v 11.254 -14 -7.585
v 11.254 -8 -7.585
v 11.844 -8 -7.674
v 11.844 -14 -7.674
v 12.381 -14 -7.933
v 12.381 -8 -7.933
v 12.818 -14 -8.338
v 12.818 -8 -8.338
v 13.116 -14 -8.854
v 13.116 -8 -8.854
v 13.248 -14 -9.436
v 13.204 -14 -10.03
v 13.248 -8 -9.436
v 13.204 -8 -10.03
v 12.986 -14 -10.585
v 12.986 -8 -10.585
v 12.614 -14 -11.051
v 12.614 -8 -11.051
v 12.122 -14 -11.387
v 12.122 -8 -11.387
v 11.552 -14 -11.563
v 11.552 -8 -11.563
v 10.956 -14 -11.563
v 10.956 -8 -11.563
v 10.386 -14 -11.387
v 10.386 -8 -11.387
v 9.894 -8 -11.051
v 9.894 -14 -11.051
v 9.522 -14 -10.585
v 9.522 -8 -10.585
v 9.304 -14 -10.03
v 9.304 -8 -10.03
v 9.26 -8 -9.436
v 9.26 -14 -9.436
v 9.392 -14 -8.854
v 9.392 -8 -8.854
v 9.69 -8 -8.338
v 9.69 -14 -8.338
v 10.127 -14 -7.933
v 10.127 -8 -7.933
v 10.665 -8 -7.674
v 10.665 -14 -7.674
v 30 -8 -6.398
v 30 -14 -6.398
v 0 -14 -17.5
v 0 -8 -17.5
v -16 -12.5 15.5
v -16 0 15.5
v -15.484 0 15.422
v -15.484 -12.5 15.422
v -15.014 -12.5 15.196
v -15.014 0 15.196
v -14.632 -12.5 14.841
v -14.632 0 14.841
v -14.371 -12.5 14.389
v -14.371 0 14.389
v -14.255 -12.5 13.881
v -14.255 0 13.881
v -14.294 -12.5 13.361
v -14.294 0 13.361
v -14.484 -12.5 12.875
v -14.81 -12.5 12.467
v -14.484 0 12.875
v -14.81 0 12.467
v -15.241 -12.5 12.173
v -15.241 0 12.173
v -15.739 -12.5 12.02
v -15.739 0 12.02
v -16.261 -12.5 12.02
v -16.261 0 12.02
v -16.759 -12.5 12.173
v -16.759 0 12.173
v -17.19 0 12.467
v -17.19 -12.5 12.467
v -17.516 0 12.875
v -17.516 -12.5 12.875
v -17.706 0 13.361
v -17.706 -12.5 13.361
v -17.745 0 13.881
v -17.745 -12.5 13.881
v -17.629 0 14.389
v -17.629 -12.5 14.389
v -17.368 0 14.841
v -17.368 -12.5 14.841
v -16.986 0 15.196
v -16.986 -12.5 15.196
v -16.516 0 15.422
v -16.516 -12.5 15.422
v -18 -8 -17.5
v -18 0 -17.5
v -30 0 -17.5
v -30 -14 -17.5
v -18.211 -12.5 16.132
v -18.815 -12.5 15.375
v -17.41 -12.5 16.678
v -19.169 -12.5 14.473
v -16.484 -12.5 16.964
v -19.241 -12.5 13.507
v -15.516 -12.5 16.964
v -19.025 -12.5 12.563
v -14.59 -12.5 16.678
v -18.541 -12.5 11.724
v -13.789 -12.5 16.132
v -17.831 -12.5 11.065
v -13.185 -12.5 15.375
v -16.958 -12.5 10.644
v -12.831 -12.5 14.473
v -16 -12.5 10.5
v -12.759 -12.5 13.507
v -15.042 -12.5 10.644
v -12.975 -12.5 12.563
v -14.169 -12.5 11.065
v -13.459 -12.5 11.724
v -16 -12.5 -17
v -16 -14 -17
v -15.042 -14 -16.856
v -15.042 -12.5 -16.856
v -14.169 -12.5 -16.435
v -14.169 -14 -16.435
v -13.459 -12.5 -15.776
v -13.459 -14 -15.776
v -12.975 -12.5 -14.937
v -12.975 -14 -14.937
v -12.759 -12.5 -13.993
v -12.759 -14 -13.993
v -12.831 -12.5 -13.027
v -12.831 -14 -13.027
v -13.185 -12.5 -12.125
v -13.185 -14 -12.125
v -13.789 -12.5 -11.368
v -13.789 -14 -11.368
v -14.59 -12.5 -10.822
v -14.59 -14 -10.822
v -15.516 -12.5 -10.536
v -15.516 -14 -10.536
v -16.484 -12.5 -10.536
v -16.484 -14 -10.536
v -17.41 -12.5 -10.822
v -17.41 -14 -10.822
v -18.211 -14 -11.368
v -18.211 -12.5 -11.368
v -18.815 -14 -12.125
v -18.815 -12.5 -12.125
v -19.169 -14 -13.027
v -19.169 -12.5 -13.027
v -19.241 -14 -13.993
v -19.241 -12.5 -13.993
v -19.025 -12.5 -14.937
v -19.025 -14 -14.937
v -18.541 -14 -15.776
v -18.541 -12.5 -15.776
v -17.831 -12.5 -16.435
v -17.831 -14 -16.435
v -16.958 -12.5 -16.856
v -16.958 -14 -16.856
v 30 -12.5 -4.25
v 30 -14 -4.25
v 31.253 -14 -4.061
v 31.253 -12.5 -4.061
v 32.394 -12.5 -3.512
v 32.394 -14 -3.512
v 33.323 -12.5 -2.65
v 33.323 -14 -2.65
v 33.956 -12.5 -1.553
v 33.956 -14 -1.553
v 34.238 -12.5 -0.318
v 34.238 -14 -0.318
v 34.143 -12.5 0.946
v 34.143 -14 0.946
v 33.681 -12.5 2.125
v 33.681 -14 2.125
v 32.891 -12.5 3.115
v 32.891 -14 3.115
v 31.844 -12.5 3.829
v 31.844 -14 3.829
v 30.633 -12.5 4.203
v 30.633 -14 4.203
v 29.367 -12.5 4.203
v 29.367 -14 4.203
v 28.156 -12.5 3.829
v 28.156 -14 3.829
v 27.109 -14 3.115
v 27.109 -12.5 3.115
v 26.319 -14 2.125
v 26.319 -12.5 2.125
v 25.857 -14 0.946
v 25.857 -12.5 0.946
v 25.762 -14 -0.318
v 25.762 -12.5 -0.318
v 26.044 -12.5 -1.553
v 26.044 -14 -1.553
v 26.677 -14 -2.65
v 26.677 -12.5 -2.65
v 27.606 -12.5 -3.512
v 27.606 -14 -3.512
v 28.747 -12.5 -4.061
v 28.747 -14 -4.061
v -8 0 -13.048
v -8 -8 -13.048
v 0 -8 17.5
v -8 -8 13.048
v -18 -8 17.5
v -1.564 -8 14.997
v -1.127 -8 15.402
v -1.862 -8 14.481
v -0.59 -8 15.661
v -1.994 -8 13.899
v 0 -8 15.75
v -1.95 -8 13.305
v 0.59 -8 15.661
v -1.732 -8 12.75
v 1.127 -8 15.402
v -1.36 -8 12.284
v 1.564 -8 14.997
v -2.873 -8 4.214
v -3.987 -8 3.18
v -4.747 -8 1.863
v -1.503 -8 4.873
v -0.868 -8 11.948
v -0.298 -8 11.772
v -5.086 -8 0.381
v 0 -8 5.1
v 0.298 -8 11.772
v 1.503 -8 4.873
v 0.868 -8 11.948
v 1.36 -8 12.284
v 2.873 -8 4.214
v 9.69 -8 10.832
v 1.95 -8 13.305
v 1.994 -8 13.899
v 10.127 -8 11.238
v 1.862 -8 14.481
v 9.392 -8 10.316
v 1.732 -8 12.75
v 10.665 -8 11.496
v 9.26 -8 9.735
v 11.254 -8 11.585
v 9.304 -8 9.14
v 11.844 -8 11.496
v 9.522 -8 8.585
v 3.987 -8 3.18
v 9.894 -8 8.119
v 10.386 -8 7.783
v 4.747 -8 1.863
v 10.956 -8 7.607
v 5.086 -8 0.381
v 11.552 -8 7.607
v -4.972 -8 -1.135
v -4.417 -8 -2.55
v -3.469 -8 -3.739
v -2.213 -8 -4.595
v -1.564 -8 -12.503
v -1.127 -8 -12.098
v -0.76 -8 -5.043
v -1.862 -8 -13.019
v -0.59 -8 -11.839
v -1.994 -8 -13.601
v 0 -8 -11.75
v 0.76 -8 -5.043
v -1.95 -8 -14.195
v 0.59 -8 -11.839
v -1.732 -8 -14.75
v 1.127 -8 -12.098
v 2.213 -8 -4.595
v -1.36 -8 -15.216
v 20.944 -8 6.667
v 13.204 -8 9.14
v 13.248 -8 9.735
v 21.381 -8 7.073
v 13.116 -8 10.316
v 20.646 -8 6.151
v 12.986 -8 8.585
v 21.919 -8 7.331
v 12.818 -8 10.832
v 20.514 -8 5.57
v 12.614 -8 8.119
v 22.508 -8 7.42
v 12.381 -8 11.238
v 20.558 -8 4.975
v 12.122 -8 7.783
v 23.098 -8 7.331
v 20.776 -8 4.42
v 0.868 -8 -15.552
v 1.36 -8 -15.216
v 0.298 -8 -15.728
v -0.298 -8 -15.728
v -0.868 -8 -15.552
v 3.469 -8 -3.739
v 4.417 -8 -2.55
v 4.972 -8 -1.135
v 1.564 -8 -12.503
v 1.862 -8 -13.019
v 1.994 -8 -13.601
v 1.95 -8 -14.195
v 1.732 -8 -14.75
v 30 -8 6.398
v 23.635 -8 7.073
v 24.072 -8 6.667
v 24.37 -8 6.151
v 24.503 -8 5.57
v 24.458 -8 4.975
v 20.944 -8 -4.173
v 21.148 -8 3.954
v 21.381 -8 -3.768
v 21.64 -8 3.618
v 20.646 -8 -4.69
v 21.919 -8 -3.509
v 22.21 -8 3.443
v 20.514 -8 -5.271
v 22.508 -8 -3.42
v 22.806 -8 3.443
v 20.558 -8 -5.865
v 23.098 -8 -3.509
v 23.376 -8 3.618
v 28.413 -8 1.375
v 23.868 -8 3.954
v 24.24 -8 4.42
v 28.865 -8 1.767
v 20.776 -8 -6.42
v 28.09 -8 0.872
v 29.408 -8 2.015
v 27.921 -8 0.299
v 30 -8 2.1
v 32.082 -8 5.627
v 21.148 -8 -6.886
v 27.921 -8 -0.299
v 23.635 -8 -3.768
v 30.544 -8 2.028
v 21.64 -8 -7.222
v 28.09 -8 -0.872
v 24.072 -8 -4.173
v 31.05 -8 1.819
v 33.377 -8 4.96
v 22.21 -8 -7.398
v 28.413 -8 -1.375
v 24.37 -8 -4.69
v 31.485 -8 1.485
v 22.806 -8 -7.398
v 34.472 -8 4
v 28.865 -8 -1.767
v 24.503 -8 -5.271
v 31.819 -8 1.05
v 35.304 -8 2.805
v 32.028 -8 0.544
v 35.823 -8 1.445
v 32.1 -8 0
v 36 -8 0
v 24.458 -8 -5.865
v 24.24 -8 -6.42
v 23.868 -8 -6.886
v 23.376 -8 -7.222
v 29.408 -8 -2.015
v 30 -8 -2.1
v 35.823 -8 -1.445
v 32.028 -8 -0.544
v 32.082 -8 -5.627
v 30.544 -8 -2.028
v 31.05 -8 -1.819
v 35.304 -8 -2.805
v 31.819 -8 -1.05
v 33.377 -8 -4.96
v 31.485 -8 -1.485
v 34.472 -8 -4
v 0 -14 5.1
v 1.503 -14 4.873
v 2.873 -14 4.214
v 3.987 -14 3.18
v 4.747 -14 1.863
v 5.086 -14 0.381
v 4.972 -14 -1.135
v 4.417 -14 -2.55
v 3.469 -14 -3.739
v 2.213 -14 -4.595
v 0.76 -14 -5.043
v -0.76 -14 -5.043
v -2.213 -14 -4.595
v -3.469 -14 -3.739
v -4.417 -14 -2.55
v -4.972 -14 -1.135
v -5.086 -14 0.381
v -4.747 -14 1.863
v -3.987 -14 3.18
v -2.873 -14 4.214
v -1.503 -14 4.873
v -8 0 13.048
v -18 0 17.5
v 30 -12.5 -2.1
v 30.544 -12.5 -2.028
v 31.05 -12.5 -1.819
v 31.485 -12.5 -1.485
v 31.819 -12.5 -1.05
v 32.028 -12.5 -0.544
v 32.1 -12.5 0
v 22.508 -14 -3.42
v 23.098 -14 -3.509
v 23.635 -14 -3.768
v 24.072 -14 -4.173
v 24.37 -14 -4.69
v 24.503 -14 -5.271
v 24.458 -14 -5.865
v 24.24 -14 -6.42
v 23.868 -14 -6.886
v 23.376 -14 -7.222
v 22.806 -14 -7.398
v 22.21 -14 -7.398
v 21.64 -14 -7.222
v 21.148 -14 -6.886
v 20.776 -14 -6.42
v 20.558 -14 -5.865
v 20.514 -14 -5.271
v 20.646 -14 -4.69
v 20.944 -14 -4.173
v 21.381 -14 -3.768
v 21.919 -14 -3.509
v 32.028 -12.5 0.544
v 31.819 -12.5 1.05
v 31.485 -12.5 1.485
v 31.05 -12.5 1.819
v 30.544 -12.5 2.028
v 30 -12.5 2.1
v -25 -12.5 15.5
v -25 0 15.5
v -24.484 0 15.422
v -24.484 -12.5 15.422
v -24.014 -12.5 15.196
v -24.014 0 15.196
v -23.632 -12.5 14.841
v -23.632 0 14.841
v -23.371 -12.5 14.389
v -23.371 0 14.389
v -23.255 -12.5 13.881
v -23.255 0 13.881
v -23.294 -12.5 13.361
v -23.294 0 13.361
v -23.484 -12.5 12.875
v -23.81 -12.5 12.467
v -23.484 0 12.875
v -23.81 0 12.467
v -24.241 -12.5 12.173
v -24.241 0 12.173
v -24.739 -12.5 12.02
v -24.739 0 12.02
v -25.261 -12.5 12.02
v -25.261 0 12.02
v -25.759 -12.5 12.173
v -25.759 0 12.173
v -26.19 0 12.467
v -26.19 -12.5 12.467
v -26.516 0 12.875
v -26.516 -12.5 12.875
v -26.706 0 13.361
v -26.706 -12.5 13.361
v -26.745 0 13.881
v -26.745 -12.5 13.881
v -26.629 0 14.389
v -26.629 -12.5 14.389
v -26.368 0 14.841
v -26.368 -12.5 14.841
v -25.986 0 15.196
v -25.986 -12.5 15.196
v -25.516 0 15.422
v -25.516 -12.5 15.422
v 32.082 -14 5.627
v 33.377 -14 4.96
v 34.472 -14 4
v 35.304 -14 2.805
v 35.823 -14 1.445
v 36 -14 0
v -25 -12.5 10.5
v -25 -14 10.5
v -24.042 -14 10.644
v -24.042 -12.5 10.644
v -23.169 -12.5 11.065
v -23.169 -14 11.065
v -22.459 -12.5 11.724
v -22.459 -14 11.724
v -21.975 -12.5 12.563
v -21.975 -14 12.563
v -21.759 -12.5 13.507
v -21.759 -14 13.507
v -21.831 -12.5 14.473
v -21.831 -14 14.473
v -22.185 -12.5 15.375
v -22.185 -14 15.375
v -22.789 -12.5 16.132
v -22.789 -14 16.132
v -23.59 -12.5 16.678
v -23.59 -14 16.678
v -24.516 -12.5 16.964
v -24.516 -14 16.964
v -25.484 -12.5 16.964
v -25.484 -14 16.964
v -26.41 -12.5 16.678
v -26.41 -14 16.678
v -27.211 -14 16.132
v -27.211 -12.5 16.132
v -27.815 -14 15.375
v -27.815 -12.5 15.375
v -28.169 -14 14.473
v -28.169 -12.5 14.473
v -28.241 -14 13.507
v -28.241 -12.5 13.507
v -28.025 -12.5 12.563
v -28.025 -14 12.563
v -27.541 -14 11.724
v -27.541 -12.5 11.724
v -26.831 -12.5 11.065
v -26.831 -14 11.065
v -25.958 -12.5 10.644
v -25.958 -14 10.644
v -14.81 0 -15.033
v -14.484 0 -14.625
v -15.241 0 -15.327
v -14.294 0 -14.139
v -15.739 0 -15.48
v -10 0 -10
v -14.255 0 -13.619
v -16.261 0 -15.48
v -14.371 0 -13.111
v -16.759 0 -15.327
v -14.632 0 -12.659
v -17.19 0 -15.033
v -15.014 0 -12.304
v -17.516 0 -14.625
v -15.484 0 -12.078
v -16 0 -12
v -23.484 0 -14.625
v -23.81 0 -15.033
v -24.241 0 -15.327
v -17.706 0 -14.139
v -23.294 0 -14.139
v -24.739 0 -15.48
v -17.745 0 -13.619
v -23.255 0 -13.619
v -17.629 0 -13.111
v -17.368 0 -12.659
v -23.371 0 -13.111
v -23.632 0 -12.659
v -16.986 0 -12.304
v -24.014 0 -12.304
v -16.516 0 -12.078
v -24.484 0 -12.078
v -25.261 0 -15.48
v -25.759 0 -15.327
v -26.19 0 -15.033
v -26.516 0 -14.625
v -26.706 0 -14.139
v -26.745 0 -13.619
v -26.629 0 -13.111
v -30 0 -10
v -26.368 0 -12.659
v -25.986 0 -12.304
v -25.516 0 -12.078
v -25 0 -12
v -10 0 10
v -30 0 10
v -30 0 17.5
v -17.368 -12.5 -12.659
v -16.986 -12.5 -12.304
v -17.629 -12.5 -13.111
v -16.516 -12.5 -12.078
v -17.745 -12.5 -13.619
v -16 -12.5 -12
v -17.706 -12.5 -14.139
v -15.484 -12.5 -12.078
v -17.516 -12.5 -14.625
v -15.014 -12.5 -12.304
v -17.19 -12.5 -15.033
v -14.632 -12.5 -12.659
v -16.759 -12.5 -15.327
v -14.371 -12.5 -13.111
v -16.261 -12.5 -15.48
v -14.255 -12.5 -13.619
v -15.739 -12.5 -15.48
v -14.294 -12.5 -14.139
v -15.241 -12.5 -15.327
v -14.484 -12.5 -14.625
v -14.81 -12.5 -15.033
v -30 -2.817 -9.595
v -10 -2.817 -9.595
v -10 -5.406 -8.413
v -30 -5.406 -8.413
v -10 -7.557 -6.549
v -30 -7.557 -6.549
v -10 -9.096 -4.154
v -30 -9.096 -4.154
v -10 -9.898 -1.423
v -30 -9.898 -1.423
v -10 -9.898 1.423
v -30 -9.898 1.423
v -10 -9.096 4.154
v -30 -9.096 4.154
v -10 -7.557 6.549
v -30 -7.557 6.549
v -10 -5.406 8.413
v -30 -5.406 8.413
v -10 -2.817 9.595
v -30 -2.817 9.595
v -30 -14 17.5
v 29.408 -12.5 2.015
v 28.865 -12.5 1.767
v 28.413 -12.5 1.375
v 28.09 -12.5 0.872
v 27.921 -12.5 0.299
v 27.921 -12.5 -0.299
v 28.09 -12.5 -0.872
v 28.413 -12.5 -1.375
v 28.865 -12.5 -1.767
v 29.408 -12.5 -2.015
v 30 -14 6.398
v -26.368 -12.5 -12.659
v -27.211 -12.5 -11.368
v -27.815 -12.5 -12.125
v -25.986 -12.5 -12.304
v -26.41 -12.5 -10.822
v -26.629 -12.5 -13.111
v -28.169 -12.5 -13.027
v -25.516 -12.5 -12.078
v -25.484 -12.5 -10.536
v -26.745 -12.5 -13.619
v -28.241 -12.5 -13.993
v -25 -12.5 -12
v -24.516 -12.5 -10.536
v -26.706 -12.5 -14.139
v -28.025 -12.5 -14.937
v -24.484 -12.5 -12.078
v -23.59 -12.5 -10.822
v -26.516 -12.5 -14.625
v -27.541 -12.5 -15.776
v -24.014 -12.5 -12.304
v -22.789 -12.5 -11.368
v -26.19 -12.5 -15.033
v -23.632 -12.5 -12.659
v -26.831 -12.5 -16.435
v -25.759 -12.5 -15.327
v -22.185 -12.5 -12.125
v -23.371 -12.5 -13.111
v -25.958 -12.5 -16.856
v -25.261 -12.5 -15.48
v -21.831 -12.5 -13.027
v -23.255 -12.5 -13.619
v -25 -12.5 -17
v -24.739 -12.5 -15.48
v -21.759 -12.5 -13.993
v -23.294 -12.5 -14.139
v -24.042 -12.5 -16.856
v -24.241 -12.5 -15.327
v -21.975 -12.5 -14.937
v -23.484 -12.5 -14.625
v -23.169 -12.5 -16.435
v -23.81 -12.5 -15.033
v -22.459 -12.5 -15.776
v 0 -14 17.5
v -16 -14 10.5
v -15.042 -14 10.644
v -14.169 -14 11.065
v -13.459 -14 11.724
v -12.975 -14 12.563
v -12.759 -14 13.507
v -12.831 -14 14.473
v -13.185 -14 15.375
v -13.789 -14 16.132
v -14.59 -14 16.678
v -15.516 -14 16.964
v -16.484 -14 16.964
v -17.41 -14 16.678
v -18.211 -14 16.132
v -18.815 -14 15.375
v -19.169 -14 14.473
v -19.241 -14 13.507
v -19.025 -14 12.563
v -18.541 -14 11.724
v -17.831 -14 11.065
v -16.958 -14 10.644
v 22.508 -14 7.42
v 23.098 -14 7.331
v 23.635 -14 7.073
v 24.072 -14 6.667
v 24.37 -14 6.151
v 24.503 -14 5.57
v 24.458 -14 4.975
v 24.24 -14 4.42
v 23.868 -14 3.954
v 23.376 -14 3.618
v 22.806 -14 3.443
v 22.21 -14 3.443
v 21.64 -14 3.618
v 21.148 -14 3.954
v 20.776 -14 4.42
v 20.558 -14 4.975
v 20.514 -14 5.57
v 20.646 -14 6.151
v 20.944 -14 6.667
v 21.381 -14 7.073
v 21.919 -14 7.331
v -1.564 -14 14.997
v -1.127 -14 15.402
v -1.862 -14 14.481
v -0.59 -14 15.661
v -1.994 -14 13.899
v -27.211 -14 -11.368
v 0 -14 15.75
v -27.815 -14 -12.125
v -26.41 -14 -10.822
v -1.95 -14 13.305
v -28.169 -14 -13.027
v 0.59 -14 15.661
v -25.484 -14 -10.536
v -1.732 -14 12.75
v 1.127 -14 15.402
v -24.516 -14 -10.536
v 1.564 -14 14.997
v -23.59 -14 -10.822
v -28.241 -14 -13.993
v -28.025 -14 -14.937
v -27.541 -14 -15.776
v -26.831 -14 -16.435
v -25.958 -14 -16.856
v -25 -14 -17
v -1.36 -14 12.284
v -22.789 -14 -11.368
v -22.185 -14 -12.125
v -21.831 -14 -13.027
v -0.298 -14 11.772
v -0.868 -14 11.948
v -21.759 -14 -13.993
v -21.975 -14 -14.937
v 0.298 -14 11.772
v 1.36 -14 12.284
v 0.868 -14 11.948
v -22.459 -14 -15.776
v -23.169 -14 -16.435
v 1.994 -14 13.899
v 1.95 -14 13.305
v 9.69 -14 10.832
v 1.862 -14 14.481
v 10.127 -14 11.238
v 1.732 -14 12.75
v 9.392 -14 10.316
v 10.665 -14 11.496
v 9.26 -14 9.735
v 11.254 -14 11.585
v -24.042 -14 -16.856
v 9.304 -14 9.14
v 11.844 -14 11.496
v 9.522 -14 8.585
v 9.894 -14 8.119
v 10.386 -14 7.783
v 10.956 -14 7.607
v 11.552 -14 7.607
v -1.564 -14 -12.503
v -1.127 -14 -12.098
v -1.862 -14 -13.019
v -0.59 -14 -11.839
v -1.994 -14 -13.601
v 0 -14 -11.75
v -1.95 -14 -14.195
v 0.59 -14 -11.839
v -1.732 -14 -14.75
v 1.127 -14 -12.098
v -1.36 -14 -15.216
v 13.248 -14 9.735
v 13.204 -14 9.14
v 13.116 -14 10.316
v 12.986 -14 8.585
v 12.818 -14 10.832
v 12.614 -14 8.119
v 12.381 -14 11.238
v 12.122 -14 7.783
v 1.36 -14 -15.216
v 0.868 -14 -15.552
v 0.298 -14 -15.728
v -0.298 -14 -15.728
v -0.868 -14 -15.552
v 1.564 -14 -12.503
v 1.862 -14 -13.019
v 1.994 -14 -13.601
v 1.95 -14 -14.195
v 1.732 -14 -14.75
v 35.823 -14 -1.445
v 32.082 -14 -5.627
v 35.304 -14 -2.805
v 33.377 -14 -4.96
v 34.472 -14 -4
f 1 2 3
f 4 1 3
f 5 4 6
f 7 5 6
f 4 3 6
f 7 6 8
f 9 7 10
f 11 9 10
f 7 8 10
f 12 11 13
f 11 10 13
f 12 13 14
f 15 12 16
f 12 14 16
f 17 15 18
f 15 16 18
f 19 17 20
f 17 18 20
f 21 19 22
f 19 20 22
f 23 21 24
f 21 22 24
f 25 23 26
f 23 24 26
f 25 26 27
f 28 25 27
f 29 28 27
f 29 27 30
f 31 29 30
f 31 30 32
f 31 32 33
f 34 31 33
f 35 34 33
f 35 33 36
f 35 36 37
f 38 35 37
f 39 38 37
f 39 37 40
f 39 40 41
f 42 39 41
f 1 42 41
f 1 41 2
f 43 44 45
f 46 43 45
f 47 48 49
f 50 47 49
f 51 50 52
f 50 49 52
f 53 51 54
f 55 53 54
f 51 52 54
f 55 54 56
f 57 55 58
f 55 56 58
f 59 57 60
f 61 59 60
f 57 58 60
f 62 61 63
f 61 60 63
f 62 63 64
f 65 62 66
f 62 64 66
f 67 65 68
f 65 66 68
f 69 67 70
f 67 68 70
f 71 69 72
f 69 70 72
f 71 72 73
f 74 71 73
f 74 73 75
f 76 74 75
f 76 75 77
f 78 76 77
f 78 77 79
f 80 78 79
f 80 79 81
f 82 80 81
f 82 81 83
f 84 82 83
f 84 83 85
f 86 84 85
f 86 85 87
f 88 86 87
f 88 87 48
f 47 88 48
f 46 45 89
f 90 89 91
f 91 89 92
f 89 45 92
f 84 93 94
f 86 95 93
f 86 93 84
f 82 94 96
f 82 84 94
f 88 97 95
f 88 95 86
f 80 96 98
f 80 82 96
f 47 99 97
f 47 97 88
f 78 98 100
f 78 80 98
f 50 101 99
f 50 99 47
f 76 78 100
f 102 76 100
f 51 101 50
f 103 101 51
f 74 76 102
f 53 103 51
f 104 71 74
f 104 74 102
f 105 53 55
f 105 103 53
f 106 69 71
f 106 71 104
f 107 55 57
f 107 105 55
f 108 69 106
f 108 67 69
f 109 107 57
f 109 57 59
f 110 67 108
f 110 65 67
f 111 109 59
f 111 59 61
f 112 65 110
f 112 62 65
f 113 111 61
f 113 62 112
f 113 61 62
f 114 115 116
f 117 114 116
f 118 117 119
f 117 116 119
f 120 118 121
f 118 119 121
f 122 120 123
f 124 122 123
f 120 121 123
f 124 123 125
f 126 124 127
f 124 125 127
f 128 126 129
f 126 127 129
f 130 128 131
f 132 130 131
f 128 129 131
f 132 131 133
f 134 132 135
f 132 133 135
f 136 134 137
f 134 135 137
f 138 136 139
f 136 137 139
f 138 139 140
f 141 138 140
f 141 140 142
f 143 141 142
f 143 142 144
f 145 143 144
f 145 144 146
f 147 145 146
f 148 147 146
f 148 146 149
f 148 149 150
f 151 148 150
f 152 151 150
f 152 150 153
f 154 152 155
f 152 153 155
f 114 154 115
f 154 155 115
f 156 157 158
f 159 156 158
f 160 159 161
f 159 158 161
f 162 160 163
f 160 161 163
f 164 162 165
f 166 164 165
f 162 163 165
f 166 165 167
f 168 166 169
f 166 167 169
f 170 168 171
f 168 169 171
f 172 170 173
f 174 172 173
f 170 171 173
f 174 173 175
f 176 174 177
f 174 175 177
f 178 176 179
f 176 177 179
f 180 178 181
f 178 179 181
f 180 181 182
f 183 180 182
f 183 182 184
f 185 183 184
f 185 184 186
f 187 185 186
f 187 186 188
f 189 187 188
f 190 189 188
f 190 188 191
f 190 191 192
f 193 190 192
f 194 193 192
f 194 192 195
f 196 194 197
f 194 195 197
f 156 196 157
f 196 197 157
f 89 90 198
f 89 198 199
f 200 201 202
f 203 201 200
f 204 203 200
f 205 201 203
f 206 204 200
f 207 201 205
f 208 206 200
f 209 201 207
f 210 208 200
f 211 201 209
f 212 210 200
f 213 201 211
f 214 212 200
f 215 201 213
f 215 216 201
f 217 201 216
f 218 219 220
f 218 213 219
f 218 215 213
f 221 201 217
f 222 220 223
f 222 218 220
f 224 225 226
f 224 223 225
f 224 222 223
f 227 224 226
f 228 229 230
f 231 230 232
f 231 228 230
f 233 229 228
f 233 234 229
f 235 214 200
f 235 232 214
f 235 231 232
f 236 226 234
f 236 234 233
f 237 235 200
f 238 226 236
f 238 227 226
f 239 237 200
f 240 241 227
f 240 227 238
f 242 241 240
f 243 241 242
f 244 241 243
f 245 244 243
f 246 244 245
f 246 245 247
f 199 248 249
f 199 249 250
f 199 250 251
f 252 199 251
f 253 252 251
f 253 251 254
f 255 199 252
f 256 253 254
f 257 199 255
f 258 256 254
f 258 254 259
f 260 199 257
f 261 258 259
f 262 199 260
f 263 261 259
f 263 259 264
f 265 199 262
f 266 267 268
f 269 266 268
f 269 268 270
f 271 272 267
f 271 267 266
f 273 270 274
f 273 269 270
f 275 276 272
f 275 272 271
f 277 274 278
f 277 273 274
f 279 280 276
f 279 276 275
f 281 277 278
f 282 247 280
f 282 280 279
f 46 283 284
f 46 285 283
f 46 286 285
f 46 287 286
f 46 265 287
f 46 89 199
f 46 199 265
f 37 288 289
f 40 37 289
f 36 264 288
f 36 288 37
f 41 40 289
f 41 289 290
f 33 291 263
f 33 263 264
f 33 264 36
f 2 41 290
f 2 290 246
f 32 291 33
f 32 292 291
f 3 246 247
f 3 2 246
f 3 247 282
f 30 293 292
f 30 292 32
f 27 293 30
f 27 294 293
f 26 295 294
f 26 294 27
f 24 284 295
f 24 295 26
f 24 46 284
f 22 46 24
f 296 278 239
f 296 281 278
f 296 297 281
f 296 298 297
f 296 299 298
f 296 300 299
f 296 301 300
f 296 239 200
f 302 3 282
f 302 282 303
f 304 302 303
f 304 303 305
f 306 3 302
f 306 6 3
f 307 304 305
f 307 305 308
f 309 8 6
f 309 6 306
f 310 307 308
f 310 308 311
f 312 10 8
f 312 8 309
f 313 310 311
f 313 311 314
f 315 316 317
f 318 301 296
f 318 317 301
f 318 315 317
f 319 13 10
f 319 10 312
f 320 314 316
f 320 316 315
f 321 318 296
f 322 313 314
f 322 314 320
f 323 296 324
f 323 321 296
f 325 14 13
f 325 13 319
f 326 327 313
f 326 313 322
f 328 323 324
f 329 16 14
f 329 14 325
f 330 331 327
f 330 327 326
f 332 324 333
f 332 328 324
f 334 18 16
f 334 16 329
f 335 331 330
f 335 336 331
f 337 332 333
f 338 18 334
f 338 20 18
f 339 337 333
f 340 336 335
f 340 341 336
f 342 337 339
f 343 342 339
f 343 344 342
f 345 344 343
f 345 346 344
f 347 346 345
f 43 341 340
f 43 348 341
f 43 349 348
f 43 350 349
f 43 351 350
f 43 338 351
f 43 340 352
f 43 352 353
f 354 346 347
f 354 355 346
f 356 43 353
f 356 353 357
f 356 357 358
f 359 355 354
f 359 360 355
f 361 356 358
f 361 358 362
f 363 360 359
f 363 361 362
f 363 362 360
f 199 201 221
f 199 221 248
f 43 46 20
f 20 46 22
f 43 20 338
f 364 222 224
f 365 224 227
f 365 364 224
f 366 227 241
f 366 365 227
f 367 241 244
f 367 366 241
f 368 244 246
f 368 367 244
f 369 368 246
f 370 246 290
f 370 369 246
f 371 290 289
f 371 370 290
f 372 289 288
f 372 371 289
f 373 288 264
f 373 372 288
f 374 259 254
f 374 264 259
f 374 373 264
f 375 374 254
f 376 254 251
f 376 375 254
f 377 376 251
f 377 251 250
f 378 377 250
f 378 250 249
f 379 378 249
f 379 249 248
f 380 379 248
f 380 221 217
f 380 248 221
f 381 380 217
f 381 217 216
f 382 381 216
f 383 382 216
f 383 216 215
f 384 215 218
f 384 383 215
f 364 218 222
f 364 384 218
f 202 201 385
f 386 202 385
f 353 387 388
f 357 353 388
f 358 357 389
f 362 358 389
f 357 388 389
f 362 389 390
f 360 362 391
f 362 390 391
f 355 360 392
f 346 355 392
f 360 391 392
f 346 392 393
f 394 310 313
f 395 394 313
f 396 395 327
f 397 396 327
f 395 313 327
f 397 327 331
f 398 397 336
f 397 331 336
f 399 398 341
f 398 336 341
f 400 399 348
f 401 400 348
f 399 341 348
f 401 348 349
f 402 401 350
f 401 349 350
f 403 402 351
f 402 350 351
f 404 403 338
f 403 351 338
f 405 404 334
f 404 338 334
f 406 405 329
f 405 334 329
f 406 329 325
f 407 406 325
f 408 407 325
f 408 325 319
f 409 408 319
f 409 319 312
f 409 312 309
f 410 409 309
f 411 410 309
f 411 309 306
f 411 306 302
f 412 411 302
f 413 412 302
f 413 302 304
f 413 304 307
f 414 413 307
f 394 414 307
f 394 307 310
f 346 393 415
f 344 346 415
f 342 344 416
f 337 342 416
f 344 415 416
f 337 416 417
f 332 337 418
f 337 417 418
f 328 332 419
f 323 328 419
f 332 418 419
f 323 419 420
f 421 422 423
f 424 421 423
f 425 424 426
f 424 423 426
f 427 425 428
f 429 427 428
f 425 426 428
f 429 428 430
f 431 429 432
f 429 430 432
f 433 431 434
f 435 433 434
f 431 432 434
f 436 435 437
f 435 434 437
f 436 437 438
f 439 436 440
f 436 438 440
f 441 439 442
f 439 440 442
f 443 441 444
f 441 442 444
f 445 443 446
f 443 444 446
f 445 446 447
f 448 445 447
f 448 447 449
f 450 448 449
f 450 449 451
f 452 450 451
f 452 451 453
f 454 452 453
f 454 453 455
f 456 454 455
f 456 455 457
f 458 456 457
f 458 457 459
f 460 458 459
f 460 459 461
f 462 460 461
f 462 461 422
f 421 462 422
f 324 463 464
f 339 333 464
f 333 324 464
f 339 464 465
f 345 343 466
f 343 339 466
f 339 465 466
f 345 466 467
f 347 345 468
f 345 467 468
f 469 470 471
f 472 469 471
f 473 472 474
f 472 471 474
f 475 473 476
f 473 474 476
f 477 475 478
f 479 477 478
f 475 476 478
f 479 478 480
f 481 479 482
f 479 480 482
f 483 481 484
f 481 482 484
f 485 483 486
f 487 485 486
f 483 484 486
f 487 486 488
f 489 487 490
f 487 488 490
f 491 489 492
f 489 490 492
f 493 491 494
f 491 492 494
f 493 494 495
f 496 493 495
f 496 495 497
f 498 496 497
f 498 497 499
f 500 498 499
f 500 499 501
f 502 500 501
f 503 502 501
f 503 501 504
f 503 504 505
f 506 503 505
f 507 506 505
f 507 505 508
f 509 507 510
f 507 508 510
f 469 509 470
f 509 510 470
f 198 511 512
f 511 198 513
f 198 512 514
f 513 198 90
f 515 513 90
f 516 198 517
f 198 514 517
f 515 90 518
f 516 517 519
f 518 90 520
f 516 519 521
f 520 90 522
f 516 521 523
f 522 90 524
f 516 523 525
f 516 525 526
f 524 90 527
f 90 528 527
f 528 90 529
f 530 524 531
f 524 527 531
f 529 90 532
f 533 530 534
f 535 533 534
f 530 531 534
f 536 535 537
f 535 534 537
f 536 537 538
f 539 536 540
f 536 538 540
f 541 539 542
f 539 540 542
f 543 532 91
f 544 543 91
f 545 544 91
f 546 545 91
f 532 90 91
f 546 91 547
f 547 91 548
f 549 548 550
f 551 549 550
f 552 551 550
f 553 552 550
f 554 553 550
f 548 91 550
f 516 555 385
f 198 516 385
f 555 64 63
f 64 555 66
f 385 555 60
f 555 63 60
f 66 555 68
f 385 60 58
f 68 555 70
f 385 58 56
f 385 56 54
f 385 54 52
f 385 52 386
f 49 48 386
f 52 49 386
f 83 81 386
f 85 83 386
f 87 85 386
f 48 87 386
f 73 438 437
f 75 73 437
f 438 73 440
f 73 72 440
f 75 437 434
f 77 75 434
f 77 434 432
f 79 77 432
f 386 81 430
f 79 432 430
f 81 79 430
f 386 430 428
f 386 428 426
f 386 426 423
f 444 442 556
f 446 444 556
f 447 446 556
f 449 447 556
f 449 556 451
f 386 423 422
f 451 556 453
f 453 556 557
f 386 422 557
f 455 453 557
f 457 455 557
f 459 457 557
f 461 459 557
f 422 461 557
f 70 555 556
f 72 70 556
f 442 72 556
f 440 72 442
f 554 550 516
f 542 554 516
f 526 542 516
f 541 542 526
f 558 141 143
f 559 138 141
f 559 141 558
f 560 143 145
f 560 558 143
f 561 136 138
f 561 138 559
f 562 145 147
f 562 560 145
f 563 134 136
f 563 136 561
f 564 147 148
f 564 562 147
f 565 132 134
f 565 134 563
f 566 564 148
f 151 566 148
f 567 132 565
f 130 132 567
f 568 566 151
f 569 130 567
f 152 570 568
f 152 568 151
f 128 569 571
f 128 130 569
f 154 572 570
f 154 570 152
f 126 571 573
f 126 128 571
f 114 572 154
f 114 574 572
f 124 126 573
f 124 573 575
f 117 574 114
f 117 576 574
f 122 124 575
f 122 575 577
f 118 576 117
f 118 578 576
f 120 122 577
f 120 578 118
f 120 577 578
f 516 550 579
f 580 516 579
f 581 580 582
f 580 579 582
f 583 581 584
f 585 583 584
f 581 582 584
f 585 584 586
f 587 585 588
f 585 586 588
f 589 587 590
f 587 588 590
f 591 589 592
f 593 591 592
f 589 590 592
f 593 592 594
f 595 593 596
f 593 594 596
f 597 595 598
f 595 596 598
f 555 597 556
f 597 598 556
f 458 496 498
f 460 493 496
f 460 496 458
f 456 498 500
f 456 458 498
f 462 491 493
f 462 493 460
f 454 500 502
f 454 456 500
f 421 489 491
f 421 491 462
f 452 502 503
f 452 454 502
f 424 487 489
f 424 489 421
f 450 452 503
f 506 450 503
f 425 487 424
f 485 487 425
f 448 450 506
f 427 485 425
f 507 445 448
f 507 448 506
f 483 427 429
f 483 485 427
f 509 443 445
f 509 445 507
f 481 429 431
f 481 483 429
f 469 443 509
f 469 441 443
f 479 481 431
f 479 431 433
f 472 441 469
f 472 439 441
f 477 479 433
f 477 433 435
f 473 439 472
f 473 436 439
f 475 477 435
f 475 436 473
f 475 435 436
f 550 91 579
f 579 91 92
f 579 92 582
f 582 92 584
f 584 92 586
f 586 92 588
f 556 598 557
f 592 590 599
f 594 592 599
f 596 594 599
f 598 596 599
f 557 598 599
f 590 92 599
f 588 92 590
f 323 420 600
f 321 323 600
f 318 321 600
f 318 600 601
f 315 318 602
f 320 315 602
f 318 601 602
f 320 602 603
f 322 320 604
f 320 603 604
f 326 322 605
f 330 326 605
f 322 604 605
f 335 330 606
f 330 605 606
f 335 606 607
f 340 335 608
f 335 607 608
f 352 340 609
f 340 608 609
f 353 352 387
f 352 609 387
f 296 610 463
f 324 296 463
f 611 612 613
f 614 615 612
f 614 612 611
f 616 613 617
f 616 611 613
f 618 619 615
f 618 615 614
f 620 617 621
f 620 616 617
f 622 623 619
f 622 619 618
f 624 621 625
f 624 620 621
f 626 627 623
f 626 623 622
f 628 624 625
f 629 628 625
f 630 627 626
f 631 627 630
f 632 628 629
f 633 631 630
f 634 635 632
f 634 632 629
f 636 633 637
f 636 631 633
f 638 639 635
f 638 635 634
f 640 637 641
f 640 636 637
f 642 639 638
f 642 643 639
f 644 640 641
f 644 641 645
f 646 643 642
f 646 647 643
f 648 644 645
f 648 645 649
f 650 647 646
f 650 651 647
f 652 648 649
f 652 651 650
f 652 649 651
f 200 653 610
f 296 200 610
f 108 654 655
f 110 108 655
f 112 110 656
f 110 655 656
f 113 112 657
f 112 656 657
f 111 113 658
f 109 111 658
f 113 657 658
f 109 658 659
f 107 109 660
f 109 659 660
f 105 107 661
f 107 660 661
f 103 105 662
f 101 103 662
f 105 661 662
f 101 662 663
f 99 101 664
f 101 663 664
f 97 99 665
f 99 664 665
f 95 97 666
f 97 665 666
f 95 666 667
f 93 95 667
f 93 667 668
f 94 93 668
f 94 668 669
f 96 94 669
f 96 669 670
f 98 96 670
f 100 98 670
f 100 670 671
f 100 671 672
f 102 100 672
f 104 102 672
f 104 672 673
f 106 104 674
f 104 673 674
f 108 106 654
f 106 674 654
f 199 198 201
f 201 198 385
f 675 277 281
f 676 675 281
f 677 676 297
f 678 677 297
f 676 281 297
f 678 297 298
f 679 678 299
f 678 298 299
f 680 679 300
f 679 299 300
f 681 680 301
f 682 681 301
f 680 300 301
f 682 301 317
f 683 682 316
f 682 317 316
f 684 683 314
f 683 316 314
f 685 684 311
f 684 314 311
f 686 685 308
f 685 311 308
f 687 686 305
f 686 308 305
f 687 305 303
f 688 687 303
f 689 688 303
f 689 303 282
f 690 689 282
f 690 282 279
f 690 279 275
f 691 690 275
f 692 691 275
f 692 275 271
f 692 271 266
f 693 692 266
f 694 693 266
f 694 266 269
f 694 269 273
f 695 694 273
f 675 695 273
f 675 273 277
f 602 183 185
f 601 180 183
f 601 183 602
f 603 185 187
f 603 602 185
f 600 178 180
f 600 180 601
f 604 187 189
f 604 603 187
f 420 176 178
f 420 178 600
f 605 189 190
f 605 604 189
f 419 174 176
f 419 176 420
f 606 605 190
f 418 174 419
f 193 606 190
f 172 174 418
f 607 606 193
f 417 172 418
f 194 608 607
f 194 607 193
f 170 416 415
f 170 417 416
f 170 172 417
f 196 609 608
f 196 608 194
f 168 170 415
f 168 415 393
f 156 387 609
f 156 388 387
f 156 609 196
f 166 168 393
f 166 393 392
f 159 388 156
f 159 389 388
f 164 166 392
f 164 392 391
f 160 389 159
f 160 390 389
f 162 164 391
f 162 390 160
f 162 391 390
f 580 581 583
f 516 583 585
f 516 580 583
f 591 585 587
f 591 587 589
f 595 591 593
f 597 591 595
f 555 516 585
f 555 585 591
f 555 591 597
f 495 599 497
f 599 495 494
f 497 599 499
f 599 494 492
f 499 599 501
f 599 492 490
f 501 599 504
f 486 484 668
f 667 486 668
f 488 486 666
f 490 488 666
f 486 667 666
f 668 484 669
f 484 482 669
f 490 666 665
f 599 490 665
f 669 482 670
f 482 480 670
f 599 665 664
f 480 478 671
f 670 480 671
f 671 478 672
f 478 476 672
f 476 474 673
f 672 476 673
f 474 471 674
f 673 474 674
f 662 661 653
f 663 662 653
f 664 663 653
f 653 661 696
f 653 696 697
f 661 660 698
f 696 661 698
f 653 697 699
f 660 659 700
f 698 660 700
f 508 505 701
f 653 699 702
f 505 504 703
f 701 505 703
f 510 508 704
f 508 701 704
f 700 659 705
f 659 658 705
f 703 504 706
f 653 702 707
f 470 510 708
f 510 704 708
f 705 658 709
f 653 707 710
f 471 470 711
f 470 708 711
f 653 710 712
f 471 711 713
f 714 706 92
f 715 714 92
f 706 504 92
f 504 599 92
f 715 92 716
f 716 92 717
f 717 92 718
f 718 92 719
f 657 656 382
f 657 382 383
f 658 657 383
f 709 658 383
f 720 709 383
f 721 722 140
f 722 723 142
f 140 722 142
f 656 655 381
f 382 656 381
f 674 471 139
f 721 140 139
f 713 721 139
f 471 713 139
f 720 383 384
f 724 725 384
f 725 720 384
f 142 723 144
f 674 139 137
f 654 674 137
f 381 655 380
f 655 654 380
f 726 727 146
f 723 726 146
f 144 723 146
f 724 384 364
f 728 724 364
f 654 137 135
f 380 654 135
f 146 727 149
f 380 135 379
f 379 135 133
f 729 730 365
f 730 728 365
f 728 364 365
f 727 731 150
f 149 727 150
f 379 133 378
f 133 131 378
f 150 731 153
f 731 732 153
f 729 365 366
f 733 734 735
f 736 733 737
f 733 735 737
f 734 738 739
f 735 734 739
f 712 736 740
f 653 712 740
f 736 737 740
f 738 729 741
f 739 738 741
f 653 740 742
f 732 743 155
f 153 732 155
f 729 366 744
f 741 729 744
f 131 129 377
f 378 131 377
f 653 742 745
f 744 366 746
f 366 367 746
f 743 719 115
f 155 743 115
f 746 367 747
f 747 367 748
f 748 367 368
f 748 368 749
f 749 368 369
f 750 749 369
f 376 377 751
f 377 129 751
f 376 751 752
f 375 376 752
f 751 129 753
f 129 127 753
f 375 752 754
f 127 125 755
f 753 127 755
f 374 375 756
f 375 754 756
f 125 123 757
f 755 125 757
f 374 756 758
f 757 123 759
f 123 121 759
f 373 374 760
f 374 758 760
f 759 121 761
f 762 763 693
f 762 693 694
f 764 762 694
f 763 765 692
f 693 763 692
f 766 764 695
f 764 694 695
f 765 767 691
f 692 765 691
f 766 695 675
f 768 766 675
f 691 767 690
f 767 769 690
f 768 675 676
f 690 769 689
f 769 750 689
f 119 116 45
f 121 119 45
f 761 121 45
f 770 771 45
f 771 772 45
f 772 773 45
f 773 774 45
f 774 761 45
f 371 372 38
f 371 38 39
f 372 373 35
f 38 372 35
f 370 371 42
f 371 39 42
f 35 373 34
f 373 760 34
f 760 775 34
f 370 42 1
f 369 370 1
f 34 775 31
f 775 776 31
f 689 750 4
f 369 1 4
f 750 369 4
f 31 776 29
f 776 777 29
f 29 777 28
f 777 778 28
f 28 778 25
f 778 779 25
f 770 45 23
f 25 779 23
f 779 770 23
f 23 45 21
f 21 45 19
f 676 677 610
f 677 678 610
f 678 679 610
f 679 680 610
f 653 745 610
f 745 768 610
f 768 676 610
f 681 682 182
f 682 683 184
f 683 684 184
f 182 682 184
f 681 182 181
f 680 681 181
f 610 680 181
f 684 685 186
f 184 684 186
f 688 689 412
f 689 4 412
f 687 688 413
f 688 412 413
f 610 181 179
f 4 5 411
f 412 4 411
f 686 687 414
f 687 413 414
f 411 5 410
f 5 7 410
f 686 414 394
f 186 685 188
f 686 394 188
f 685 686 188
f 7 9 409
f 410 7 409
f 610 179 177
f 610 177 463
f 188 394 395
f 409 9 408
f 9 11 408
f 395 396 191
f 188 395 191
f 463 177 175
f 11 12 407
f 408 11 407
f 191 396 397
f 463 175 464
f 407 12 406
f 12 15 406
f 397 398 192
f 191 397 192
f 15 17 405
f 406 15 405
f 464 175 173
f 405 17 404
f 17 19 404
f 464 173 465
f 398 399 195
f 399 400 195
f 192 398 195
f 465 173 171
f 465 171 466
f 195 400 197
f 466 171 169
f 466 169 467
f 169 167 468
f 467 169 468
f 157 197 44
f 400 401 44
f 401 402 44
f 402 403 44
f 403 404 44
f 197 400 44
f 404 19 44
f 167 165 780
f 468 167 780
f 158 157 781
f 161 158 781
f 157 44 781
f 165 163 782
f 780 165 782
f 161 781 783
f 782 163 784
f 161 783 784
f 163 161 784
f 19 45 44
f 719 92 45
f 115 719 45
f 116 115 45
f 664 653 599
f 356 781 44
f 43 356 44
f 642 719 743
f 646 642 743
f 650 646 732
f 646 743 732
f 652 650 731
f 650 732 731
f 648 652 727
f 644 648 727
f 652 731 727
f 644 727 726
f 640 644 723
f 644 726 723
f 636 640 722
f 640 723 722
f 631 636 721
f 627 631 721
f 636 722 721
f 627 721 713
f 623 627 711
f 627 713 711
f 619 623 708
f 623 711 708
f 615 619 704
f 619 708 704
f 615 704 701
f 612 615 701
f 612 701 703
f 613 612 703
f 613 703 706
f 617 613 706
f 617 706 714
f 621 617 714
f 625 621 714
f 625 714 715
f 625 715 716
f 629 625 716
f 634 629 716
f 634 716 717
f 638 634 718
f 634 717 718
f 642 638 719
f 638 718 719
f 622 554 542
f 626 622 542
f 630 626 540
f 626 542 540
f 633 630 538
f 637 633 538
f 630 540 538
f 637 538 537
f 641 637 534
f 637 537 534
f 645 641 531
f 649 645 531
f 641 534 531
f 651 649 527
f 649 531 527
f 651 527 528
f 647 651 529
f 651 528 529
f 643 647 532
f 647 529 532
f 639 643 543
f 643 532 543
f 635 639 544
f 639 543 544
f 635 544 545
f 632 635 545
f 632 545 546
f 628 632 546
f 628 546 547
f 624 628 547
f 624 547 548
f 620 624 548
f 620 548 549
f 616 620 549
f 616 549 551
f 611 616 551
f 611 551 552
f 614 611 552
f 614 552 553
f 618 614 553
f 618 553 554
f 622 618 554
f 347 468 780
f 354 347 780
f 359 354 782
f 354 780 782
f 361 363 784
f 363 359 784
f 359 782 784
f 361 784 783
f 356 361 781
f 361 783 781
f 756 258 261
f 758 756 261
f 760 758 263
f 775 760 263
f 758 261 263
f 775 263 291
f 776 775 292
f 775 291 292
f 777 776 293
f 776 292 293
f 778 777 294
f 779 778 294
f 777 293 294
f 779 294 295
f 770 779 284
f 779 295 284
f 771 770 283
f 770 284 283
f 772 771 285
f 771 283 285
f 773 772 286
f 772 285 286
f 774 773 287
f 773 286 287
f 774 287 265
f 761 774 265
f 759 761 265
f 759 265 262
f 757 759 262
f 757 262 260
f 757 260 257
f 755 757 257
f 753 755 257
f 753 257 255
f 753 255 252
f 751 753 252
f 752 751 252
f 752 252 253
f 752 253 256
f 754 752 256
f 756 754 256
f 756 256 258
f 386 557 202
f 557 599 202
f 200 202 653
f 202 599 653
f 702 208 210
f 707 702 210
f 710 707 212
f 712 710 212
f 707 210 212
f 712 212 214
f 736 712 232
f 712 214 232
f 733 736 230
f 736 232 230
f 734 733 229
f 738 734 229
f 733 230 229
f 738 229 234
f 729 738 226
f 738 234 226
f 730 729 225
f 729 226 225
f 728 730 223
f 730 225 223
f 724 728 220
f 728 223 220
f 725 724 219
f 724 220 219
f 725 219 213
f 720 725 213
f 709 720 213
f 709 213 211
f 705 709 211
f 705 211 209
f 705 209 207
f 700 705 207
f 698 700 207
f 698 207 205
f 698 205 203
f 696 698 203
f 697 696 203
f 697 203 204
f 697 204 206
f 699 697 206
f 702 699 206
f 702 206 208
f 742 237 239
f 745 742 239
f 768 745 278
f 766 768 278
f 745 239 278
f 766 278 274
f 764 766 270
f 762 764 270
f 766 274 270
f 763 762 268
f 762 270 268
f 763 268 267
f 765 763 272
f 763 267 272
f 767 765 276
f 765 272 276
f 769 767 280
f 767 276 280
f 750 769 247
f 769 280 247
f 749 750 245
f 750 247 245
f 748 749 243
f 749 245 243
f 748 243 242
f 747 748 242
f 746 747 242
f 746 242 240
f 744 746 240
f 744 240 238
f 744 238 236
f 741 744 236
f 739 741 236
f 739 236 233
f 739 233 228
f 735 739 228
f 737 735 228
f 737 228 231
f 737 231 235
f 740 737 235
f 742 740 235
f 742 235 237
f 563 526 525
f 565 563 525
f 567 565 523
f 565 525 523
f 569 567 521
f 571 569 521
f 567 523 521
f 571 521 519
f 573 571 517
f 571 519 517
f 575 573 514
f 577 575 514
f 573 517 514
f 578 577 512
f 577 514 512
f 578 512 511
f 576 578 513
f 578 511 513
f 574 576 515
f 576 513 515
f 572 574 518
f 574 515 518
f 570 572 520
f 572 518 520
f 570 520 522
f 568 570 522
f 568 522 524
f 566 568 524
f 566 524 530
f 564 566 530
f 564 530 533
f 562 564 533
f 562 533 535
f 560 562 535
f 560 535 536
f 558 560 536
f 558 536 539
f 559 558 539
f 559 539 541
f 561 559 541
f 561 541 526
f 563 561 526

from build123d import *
from OCP.BRepFilletAPI import BRepFilletAPI_MakeChamfer

# Parameters (mm, degrees)
BOSS_EXTRUDE1_DEPTH      = 14
BOSS_EXTRUDE1_DEPTH_BACK = 14
SKETCH1_R                = 5.1
SKETCH1_R_2              = 2.1
SKETCH2_R                = 10
CUT_EXTRUDE1_DEPTH       = 20
CUT_EXTRUDE2_DEPTH       = 98
SKETCH4_R                = 2
SKETCH4_R_2              = 1.75
CUT_EXTRUDE3_DEPTH       = 98
CUT_EXTRUDE4_DEPTH       = 8
CHAMFER2_SIZE            = 10
CHAMFER2_SIZE2           = 4.452286853
SKETCH6_R                = 3.25
CUT_EXTRUDE5_DEPTH       = 1.5
SKETCH7_R                = 4.25
CUT_EXTRUDE6_DEPTH       = 1.5


with BuildPart() as part:
    # Sketch1 → Boss-Extrude1 (new, two sides: drawn at the far end of the back side and taken through both)
    with BuildSketch(Plane(origin=(0, 0, 0), x_dir=(1, 0, 0), z_dir=(0, 1, 0)).offset(-BOSS_EXTRUDE1_DEPTH_BACK)):
        with BuildLine():
            Line((-30, 17.5), (-30, -17.5))
            Line((-30, -17.5), (0, -17.5))
            Line((0, -17.5), (32.082434223, -5.627030097))
            ThreePointArc((32.082434223, -5.627030097), (36, 0), (32.082434223, 5.627030097))
            Line((32.082434223, 5.627030097), (0, 17.5))
            Line((0, 17.5), (-30, 17.5))
        make_face()
        Circle(SKETCH1_R, mode=Mode.SUBTRACT)
        with Locations((30, 0)):
            Circle(SKETCH1_R_2, mode=Mode.SUBTRACT)
    extrude(amount=BOSS_EXTRUDE1_DEPTH + BOSS_EXTRUDE1_DEPTH_BACK)

    # Sketch2 → Cut-Extrude1 (cut)
    with BuildSketch(Plane.ZY.offset(30)):
        Circle(SKETCH2_R)
    extrude(amount=-CUT_EXTRUDE1_DEPTH, mode=Mode.SUBTRACT)

    # Sketch3 → Cut-Extrude2 (cut)
    with BuildSketch(Plane.ZY.offset(30)):
        Polygon((-28.780571792, 0), (30.767977005, 0), (25.762660172, 25.983482973), (-26.204305774, 26.645951377), align=None)
    extrude(amount=-CUT_EXTRUDE2_DEPTH, mode=Mode.SUBTRACT)

    # Sketch4 → Cut-Extrude3 (cut)
    with BuildSketch(Plane(origin=(0, 0, 0), x_dir=(1, 0, 0), z_dir=(0, 1, 0))):
        with Locations((0, 13.75)):
            Circle(SKETCH4_R)
        with Locations((-25, 13.75)):
            Circle(SKETCH4_R_2)
        with Locations((-16, 13.75)):
            Circle(SKETCH4_R_2)
        with Locations((-16, -13.75)):
            Circle(SKETCH4_R_2)
        with Locations((-25, -13.75)):
            Circle(SKETCH4_R_2)
        with Locations((11.254060193, 9.585131554)):
            Circle(SKETCH4_R)
        with Locations((22.508120386, 5.420263108)):
            Circle(SKETCH4_R)
        with Locations((22.508120386, -5.420263108)):
            Circle(SKETCH4_R)
        with Locations((11.254060193, -9.585131554)):
            Circle(SKETCH4_R)
        with Locations((0, -13.75)):
            Circle(SKETCH4_R)
    extrude(amount=-CUT_EXTRUDE3_DEPTH, mode=Mode.SUBTRACT)

    # Sketch5 → Cut-Extrude4 (cut)
    with BuildSketch(Plane(origin=(0, 0, 0), x_dir=(1, 0, 0), z_dir=(0, 1, 0))):
        Polygon((-8, 24.0496753), (-8, -23.963165676), (49.955299995, -27.912565933), (56.964446833, 12.889933884), align=None)
    extrude(amount=-CUT_EXTRUDE4_DEPTH, mode=Mode.SUBTRACT)

    # Chamfer2: one chamfer whose edges measure the first distance from different faces: ONE call of the kernel's chamfer builder (chamfer() names one face for all edges)
    chamfer2_edges_1 = [part.edges().sort_by_distance(p)[0] for p in [
        (-8, -4, 17.5),
    ]]
    chamfer2_side_1 = [part.faces().sort_by_distance(p)[0] for p in [
        (-16.97752809, -7.539325843, 17.5),
    ]]
    chamfer2_edges_2 = [part.edges().sort_by_distance(p)[0] for p in [
        (-8, -4, -17.5),
    ]]
    chamfer2_side_2 = [part.faces().sort_by_distance(p)[0] for p in [
        (-16.97752809, -7.539325843, -17.5),
    ]]
    chamfer2 = BRepFilletAPI_MakeChamfer(part.part.solid().wrapped)
    for e in chamfer2_edges_1:
        chamfer2.Add(CHAMFER2_SIZE, CHAMFER2_SIZE2, e.wrapped, chamfer2_side_1[0].wrapped)  # the first distance lies on this face
    for e in chamfer2_edges_2:
        chamfer2.Add(CHAMFER2_SIZE, CHAMFER2_SIZE2, e.wrapped, chamfer2_side_2[0].wrapped)  # the first distance lies on this face
    add(Compound.cast(chamfer2.Shape()), mode=Mode.REPLACE)

    # Sketch6 → Cut-Extrude5 (cut)
    with BuildSketch(Plane.XZ.offset(14)):
        with Locations((-25, 13.75)):
            Circle(SKETCH6_R)
        with Locations((-16, 13.75)):
            Circle(SKETCH6_R)
        with Locations((-25, -13.75)):
            Circle(SKETCH6_R)
        with Locations((-16, -13.75)):
            Circle(SKETCH6_R)
    extrude(amount=-CUT_EXTRUDE5_DEPTH, mode=Mode.SUBTRACT)

    # Sketch7 → Cut-Extrude6 (cut)
    with BuildSketch(Plane.XZ.offset(14)):
        with Locations((30, 0)):
            Circle(SKETCH7_R)
    extrude(amount=-CUT_EXTRUDE6_DEPTH, mode=Mode.SUBTRACT)


solid = part.part
